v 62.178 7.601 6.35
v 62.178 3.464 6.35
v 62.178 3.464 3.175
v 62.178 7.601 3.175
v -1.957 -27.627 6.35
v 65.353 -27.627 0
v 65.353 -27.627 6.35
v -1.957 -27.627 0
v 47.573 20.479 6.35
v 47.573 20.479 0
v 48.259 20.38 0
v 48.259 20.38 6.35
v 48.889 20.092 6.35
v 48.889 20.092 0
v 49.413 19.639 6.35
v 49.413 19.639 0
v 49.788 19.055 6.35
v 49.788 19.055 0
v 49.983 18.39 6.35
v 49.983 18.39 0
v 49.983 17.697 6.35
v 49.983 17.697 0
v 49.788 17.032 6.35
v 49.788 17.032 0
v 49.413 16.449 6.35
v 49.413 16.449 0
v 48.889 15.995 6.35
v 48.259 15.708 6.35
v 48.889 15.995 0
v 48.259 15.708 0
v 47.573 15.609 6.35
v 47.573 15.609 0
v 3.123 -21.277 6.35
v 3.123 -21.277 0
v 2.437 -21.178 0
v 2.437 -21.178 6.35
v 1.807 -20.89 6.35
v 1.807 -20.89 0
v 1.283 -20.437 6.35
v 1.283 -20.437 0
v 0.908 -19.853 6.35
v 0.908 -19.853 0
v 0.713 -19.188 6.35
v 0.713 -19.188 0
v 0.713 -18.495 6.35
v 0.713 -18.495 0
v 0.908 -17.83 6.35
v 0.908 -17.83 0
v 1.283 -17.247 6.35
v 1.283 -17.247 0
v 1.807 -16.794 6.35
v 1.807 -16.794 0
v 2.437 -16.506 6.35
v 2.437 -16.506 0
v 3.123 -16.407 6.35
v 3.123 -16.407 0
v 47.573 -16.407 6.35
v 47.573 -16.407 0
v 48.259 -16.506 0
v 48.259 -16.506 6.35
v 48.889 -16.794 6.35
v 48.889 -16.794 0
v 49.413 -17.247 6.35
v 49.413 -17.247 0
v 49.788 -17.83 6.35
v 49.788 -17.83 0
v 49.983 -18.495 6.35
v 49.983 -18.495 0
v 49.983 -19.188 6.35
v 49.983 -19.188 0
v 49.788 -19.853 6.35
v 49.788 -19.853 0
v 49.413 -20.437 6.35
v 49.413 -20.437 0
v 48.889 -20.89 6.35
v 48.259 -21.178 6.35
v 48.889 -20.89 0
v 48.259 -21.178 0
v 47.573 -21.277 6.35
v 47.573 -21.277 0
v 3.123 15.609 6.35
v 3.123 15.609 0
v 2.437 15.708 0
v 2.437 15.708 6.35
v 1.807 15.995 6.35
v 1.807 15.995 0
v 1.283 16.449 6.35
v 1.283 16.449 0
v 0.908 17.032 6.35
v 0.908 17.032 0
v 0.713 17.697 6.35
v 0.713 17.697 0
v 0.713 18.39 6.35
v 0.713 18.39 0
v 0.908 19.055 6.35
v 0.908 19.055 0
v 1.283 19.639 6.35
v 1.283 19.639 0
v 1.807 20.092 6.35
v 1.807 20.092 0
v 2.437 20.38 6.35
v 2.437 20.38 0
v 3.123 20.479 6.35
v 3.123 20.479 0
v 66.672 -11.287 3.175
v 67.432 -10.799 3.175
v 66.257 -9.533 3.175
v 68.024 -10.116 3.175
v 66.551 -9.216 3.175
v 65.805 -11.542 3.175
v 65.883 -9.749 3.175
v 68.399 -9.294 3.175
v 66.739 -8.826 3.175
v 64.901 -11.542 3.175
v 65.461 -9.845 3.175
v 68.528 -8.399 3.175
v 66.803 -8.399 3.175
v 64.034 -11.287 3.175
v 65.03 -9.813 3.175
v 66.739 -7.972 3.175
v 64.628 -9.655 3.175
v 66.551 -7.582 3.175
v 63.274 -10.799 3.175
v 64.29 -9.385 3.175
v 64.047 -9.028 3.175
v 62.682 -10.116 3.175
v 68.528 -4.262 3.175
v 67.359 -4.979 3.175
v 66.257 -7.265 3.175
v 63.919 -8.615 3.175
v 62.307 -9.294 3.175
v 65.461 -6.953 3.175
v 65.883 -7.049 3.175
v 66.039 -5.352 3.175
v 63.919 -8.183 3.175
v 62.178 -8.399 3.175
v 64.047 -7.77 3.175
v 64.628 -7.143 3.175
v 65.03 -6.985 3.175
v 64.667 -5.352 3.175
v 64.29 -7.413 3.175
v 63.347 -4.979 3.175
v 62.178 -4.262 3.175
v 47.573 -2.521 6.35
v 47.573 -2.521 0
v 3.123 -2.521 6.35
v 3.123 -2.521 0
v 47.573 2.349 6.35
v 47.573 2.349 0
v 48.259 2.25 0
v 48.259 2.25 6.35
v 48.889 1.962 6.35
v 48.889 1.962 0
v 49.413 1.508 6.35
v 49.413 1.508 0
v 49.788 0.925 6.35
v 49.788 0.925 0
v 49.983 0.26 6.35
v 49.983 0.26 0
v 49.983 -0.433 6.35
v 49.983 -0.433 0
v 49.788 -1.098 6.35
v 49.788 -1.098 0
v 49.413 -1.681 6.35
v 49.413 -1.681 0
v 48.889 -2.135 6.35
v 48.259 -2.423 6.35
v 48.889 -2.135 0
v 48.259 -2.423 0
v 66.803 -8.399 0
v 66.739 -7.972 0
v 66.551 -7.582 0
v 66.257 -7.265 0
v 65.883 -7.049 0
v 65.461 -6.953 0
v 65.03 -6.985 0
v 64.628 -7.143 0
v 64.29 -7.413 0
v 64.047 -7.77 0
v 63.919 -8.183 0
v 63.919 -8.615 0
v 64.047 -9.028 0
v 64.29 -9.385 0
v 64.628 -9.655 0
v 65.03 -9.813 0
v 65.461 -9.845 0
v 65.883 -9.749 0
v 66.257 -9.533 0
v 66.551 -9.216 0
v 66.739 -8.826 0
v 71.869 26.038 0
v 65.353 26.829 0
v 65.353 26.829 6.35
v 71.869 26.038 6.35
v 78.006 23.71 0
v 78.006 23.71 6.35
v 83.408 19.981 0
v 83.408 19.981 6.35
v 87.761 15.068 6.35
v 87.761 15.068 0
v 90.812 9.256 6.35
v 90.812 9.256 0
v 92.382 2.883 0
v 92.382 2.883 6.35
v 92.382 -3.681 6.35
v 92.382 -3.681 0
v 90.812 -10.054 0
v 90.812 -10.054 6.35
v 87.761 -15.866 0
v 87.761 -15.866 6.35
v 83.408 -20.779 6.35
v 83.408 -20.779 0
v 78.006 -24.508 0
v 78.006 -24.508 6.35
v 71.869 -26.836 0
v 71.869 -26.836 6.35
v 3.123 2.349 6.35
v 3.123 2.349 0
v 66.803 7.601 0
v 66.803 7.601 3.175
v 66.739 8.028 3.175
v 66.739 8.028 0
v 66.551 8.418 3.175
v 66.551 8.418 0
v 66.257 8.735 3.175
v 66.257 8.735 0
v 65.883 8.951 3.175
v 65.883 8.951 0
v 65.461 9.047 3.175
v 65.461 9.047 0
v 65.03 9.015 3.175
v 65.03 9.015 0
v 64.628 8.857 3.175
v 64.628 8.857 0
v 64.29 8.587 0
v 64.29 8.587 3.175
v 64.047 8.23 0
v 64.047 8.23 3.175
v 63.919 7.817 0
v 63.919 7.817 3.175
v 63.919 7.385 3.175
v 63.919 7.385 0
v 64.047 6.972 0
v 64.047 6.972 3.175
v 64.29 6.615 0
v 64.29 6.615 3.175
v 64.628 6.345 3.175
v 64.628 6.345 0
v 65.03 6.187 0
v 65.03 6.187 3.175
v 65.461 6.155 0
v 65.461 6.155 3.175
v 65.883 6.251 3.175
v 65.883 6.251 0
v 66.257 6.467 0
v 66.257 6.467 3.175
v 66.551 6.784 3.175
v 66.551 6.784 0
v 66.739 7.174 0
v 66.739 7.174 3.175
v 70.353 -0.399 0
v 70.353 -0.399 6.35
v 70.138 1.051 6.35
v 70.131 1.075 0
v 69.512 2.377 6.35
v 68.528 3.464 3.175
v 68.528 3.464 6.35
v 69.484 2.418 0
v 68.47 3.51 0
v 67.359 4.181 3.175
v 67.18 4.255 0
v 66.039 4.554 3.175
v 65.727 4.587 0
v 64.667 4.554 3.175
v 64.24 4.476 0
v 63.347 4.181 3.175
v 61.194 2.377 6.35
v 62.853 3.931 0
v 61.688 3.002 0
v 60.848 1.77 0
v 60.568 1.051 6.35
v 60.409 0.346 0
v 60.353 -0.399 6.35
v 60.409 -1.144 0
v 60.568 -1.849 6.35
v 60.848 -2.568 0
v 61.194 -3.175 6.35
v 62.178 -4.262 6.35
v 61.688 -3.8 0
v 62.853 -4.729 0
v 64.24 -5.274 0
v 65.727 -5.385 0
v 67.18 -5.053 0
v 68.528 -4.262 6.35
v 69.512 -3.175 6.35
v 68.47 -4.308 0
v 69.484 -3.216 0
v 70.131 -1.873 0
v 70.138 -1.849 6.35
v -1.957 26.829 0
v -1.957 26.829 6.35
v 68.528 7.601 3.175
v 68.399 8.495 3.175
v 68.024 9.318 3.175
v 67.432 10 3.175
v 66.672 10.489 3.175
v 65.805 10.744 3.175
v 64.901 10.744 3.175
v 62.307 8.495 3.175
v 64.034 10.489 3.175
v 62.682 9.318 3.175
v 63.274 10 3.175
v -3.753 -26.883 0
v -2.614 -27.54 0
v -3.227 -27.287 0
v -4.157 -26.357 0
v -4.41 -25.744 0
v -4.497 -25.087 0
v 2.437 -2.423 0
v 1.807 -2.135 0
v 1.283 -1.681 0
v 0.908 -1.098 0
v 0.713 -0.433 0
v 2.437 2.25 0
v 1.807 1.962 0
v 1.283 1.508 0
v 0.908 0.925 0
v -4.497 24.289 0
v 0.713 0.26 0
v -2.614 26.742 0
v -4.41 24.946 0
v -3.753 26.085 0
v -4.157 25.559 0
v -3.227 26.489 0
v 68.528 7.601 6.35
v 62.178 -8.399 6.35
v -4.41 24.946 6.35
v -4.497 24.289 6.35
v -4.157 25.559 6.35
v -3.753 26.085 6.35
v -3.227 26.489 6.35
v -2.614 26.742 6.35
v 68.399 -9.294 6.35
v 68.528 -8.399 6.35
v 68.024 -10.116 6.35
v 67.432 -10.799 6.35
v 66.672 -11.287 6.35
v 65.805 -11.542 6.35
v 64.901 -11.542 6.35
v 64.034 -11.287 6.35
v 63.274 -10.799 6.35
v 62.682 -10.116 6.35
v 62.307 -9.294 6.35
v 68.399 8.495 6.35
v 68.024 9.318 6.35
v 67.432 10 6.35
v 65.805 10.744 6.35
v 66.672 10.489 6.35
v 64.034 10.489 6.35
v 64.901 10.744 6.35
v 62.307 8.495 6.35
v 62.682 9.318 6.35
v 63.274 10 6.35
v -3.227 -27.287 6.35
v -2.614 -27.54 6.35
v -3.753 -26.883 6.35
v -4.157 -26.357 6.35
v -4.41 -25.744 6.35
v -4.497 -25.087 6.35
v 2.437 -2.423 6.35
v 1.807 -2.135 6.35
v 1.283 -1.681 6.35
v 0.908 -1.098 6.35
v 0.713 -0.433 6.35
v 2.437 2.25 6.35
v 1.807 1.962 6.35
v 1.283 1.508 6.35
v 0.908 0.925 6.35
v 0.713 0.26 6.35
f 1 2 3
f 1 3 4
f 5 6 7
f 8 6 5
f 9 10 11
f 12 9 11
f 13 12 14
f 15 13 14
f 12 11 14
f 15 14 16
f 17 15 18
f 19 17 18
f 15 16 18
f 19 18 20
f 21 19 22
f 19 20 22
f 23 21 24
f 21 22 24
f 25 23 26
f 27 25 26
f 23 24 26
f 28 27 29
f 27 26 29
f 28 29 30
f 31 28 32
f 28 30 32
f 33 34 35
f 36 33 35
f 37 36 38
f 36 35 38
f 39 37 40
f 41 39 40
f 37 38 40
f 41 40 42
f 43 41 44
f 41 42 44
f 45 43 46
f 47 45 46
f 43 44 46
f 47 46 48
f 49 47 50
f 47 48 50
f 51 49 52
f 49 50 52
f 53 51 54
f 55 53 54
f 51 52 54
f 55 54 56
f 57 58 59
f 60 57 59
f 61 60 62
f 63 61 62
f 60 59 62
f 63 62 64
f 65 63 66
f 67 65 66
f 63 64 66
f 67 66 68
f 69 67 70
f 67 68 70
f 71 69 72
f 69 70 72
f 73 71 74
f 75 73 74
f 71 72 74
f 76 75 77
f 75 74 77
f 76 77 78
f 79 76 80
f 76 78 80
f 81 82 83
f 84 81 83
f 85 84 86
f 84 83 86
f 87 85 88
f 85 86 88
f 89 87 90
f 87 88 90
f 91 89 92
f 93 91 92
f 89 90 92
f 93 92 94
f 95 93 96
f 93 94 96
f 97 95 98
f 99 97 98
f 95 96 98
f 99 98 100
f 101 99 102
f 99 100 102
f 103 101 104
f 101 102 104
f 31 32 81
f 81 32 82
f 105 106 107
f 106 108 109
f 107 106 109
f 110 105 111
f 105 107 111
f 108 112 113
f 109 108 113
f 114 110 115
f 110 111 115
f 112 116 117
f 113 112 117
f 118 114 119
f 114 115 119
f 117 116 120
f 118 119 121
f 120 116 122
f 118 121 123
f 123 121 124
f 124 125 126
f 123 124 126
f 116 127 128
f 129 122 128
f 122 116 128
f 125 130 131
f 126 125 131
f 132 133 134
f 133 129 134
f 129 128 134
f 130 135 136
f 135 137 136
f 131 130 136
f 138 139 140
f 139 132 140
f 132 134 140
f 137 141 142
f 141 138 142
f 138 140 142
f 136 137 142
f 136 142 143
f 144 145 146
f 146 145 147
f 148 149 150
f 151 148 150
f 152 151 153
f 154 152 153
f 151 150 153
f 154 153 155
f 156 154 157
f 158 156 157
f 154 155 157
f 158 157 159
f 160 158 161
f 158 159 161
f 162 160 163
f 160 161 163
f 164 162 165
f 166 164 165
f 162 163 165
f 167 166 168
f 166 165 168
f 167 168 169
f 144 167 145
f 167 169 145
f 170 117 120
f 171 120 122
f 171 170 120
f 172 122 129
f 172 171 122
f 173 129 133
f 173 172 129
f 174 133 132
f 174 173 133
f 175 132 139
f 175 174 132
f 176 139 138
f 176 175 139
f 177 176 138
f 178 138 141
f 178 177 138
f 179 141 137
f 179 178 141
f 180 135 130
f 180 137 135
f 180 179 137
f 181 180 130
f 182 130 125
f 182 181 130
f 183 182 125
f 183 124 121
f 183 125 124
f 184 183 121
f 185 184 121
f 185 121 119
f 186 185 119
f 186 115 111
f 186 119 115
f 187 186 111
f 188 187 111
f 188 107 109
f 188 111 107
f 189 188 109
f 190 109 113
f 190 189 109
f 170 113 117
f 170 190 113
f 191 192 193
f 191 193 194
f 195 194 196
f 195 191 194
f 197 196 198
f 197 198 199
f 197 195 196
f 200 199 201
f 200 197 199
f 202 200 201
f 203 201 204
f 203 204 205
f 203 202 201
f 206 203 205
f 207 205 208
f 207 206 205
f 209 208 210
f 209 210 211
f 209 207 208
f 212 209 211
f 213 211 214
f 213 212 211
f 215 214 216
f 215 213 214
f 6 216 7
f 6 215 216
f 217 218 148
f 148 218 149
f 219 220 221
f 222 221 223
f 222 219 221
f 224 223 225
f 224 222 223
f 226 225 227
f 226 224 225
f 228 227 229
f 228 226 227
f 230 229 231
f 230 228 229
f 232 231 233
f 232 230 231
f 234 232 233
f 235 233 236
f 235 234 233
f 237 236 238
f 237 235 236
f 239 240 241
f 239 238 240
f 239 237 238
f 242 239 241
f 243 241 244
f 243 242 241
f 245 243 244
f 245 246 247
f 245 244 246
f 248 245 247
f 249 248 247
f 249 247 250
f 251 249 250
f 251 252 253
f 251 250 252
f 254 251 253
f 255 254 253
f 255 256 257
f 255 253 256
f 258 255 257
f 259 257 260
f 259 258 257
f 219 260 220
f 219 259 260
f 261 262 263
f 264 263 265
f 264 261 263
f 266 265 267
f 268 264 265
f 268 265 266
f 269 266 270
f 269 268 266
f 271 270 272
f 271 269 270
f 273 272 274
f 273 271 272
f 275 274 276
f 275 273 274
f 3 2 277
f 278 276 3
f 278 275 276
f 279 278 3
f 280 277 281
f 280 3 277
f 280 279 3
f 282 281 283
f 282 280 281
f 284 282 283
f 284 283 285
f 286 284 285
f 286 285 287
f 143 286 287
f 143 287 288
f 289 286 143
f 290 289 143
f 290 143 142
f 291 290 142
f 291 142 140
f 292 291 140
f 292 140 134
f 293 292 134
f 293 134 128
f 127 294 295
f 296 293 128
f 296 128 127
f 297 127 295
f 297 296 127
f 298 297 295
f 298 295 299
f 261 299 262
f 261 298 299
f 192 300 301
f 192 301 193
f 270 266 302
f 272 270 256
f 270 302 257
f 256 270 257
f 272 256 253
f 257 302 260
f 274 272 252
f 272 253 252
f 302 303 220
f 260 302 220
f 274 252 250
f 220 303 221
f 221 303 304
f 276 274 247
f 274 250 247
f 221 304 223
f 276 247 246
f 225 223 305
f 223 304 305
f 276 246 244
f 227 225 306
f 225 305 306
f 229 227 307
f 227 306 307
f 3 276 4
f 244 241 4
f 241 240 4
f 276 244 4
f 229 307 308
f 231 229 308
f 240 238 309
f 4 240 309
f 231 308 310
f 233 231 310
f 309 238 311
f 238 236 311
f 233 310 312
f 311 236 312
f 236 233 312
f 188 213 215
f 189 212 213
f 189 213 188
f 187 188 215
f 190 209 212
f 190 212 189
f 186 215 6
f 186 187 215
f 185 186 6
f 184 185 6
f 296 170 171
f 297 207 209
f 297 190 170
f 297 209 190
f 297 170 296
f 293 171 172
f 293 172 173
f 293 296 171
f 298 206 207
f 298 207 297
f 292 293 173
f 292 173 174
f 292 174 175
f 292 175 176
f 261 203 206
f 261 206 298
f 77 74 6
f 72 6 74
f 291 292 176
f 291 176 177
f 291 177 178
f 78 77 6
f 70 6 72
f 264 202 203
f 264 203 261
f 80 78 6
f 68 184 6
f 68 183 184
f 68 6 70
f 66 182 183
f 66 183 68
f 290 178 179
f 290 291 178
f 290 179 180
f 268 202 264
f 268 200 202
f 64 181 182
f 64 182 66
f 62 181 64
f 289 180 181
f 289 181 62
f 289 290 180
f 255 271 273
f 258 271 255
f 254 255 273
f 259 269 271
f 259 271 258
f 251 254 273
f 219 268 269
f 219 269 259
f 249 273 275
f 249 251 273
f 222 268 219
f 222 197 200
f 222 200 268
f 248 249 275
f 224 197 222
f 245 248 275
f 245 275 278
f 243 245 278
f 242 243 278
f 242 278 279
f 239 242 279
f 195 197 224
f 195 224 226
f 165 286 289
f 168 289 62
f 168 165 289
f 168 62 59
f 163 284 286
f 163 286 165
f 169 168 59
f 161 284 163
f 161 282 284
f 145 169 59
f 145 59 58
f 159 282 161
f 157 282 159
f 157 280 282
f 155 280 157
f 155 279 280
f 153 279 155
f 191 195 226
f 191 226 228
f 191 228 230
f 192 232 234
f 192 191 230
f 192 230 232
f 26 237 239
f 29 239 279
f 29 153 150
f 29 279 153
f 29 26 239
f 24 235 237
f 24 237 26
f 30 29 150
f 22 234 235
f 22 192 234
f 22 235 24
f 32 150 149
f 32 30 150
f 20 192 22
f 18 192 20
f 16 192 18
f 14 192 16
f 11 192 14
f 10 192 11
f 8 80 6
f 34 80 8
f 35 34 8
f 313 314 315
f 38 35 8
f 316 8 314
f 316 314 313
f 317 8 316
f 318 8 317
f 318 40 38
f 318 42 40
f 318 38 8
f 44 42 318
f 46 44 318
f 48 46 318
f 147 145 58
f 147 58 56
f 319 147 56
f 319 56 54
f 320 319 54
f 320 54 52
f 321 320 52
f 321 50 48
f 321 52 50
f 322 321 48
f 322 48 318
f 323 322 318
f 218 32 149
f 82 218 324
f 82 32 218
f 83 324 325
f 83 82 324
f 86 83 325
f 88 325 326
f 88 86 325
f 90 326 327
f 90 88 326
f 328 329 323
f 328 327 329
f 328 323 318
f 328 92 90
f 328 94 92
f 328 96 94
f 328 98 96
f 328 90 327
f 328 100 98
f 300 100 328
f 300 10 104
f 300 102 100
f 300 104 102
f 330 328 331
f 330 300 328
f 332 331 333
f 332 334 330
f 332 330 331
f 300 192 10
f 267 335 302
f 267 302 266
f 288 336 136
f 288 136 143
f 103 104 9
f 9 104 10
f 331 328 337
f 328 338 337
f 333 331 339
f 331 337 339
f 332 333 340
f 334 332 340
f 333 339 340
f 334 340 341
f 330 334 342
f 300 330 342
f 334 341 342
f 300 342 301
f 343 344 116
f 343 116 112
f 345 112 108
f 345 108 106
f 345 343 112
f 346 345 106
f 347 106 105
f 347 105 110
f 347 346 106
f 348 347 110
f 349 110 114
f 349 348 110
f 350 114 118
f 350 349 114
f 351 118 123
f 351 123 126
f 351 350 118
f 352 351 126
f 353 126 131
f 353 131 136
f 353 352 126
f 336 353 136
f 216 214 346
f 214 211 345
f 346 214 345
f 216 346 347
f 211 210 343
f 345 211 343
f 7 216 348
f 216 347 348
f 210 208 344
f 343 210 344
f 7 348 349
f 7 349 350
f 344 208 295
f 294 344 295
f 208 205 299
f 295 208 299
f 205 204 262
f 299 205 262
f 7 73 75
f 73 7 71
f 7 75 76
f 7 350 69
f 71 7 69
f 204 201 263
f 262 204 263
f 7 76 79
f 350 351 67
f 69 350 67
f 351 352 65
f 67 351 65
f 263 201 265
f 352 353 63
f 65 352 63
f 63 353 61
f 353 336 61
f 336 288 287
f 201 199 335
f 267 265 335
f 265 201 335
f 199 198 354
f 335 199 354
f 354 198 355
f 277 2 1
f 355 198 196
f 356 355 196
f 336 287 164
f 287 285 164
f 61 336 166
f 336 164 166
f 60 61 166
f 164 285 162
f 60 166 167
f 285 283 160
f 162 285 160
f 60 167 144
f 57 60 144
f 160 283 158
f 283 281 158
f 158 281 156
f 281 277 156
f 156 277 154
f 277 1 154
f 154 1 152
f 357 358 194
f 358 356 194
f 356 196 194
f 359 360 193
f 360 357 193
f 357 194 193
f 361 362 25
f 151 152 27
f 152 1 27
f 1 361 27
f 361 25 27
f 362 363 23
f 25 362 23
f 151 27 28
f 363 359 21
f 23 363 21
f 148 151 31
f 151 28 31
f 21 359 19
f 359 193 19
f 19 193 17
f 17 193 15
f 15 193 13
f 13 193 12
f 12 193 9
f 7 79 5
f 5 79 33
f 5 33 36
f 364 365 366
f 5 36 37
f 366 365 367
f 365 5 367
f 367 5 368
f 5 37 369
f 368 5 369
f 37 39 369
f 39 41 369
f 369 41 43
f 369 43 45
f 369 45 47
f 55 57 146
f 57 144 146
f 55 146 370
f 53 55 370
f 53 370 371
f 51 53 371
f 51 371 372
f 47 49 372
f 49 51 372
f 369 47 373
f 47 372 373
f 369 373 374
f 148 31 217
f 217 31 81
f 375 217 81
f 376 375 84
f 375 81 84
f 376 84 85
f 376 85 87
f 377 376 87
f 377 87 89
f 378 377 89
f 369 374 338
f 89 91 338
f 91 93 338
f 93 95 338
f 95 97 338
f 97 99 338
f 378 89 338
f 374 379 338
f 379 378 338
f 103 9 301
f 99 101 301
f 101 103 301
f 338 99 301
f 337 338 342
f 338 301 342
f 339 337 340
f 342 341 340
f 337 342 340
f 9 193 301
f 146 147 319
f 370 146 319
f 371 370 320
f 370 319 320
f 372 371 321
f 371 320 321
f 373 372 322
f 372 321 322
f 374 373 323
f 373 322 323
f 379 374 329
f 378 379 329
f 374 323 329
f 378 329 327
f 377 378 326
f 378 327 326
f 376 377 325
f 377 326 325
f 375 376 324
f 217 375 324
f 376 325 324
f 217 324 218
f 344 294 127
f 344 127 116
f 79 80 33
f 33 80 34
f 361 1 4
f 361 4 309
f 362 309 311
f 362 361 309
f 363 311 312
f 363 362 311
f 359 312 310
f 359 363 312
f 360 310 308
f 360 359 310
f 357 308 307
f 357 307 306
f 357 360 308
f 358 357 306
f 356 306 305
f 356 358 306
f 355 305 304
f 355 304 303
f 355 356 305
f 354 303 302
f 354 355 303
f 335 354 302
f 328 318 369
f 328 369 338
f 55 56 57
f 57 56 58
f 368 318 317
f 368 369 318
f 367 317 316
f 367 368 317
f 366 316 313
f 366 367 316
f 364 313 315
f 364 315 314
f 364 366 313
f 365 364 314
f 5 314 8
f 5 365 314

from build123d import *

# Parameters (mm, degrees)
SKETCH1_R           = 5
SKETCH1_R_2         = 1.45
BOSS_EXTRUDE1_DEPTH = 6.35
FILLET1_R           = 2.54
FILLET2_R           = 2.54
CUT_EXTRUDE1_DEPTH  = 3.175


with BuildPart() as part:
    # Sketch1 → Boss-Extrude1 (new body)
    with BuildSketch(Plane.XY):
        with BuildLine():
            Line((-4.497024954, -27.626960595), (-4.497024954, 26.828916206))
            Line((-4.497024954, 26.828916206), (65.352975046, 26.828916206))
            ThreePointArc((65.352975046, 26.828916206), (92.580913446, -0.399022195), (65.352975046, -27.626960595))
            Line((65.352975046, -27.626960595), (-4.497024954, -27.626960595))
        make_face()
        with Locations((65.352975046, -0.399022195)):
            Circle(SKETCH1_R, mode=Mode.SUBTRACT)
        with Locations((65.352975046, 7.600977805)):
            Circle(SKETCH1_R_2, mode=Mode.SUBTRACT)
        with Locations((65.352975046, -8.399022195)):
            Circle(SKETCH1_R_2, mode=Mode.SUBTRACT)
        with BuildLine():
            Line((47.572975046, 15.608916206), (3.122975046, 15.608916206))
            ThreePointArc((3.122975046, 15.608916206), (0.687975046, 18.043916206), (3.122975046, 20.478916206))
            Line((3.122975046, 20.478916206), (47.572975046, 20.478916206))
            ThreePointArc((47.572975046, 20.478916206), (50.007975046, 18.043916206), (47.572975046, 15.608916206))
        make_face(mode=Mode.SUBTRACT)
        with BuildLine():
            Line((3.122975046, 2.348787201), (47.572975046, 2.348787201))
            ThreePointArc((47.572975046, 2.348787201), (50.007975046, -0.086212799), (47.572975046, -2.521212799))
            Line((47.572975046, -2.521212799), (3.122975046, -2.521212799))
            ThreePointArc((3.122975046, -2.521212799), (0.687975046, -0.086212799), (3.122975046, 2.348787201))
        make_face(mode=Mode.SUBTRACT)
        with BuildLine():
            Line((3.122975046, -16.406960595), (47.572975046, -16.406960595))
            ThreePointArc((47.572975046, -16.406960595), (50.007975046, -18.841960595), (47.572975046, -21.276960595))
            Line((47.572975046, -21.276960595), (3.122975046, -21.276960595))
            ThreePointArc((3.122975046, -21.276960595), (0.687975046, -18.841960595), (3.122975046, -16.406960595))
        make_face(mode=Mode.SUBTRACT)
    extrude(amount=BOSS_EXTRUDE1_DEPTH)

    # Fillet1
    fillet1_edges = [part.edges().sort_by_distance(p)[0] for p in [
        (-4.497024954, -27.626960595, 3.175),
    ]]
    fillet(fillet1_edges, radius=FILLET1_R)

    # Fillet2
    fillet2_edges = [part.edges().sort_by_distance(p)[0] for p in [
        (-4.497024954, 26.828916206, 3.175),
    ]]
    fillet(fillet2_edges, radius=FILLET2_R)

    # Sketch2 → Cut-Extrude1 (cut)
    with BuildSketch(Plane.XY.offset(6.35)):
        with BuildLine():
            Line((68.527975046, 7.600977805), (68.527975046, -8.399022195))
            ThreePointArc((68.527975046, -8.399022195), (65.352975046, -11.574022195), (62.177975046, -8.399022195))
            Line((62.177975046, -8.399022195), (62.177975046, 7.600977805))
            ThreePointArc((62.177975046, 7.600977805), (65.352975046, 10.775977805), (68.527975046, 7.600977805))
        make_face()
    extrude(amount=-CUT_EXTRUDE1_DEPTH, mode=Mode.SUBTRACT)


solid = part.part
